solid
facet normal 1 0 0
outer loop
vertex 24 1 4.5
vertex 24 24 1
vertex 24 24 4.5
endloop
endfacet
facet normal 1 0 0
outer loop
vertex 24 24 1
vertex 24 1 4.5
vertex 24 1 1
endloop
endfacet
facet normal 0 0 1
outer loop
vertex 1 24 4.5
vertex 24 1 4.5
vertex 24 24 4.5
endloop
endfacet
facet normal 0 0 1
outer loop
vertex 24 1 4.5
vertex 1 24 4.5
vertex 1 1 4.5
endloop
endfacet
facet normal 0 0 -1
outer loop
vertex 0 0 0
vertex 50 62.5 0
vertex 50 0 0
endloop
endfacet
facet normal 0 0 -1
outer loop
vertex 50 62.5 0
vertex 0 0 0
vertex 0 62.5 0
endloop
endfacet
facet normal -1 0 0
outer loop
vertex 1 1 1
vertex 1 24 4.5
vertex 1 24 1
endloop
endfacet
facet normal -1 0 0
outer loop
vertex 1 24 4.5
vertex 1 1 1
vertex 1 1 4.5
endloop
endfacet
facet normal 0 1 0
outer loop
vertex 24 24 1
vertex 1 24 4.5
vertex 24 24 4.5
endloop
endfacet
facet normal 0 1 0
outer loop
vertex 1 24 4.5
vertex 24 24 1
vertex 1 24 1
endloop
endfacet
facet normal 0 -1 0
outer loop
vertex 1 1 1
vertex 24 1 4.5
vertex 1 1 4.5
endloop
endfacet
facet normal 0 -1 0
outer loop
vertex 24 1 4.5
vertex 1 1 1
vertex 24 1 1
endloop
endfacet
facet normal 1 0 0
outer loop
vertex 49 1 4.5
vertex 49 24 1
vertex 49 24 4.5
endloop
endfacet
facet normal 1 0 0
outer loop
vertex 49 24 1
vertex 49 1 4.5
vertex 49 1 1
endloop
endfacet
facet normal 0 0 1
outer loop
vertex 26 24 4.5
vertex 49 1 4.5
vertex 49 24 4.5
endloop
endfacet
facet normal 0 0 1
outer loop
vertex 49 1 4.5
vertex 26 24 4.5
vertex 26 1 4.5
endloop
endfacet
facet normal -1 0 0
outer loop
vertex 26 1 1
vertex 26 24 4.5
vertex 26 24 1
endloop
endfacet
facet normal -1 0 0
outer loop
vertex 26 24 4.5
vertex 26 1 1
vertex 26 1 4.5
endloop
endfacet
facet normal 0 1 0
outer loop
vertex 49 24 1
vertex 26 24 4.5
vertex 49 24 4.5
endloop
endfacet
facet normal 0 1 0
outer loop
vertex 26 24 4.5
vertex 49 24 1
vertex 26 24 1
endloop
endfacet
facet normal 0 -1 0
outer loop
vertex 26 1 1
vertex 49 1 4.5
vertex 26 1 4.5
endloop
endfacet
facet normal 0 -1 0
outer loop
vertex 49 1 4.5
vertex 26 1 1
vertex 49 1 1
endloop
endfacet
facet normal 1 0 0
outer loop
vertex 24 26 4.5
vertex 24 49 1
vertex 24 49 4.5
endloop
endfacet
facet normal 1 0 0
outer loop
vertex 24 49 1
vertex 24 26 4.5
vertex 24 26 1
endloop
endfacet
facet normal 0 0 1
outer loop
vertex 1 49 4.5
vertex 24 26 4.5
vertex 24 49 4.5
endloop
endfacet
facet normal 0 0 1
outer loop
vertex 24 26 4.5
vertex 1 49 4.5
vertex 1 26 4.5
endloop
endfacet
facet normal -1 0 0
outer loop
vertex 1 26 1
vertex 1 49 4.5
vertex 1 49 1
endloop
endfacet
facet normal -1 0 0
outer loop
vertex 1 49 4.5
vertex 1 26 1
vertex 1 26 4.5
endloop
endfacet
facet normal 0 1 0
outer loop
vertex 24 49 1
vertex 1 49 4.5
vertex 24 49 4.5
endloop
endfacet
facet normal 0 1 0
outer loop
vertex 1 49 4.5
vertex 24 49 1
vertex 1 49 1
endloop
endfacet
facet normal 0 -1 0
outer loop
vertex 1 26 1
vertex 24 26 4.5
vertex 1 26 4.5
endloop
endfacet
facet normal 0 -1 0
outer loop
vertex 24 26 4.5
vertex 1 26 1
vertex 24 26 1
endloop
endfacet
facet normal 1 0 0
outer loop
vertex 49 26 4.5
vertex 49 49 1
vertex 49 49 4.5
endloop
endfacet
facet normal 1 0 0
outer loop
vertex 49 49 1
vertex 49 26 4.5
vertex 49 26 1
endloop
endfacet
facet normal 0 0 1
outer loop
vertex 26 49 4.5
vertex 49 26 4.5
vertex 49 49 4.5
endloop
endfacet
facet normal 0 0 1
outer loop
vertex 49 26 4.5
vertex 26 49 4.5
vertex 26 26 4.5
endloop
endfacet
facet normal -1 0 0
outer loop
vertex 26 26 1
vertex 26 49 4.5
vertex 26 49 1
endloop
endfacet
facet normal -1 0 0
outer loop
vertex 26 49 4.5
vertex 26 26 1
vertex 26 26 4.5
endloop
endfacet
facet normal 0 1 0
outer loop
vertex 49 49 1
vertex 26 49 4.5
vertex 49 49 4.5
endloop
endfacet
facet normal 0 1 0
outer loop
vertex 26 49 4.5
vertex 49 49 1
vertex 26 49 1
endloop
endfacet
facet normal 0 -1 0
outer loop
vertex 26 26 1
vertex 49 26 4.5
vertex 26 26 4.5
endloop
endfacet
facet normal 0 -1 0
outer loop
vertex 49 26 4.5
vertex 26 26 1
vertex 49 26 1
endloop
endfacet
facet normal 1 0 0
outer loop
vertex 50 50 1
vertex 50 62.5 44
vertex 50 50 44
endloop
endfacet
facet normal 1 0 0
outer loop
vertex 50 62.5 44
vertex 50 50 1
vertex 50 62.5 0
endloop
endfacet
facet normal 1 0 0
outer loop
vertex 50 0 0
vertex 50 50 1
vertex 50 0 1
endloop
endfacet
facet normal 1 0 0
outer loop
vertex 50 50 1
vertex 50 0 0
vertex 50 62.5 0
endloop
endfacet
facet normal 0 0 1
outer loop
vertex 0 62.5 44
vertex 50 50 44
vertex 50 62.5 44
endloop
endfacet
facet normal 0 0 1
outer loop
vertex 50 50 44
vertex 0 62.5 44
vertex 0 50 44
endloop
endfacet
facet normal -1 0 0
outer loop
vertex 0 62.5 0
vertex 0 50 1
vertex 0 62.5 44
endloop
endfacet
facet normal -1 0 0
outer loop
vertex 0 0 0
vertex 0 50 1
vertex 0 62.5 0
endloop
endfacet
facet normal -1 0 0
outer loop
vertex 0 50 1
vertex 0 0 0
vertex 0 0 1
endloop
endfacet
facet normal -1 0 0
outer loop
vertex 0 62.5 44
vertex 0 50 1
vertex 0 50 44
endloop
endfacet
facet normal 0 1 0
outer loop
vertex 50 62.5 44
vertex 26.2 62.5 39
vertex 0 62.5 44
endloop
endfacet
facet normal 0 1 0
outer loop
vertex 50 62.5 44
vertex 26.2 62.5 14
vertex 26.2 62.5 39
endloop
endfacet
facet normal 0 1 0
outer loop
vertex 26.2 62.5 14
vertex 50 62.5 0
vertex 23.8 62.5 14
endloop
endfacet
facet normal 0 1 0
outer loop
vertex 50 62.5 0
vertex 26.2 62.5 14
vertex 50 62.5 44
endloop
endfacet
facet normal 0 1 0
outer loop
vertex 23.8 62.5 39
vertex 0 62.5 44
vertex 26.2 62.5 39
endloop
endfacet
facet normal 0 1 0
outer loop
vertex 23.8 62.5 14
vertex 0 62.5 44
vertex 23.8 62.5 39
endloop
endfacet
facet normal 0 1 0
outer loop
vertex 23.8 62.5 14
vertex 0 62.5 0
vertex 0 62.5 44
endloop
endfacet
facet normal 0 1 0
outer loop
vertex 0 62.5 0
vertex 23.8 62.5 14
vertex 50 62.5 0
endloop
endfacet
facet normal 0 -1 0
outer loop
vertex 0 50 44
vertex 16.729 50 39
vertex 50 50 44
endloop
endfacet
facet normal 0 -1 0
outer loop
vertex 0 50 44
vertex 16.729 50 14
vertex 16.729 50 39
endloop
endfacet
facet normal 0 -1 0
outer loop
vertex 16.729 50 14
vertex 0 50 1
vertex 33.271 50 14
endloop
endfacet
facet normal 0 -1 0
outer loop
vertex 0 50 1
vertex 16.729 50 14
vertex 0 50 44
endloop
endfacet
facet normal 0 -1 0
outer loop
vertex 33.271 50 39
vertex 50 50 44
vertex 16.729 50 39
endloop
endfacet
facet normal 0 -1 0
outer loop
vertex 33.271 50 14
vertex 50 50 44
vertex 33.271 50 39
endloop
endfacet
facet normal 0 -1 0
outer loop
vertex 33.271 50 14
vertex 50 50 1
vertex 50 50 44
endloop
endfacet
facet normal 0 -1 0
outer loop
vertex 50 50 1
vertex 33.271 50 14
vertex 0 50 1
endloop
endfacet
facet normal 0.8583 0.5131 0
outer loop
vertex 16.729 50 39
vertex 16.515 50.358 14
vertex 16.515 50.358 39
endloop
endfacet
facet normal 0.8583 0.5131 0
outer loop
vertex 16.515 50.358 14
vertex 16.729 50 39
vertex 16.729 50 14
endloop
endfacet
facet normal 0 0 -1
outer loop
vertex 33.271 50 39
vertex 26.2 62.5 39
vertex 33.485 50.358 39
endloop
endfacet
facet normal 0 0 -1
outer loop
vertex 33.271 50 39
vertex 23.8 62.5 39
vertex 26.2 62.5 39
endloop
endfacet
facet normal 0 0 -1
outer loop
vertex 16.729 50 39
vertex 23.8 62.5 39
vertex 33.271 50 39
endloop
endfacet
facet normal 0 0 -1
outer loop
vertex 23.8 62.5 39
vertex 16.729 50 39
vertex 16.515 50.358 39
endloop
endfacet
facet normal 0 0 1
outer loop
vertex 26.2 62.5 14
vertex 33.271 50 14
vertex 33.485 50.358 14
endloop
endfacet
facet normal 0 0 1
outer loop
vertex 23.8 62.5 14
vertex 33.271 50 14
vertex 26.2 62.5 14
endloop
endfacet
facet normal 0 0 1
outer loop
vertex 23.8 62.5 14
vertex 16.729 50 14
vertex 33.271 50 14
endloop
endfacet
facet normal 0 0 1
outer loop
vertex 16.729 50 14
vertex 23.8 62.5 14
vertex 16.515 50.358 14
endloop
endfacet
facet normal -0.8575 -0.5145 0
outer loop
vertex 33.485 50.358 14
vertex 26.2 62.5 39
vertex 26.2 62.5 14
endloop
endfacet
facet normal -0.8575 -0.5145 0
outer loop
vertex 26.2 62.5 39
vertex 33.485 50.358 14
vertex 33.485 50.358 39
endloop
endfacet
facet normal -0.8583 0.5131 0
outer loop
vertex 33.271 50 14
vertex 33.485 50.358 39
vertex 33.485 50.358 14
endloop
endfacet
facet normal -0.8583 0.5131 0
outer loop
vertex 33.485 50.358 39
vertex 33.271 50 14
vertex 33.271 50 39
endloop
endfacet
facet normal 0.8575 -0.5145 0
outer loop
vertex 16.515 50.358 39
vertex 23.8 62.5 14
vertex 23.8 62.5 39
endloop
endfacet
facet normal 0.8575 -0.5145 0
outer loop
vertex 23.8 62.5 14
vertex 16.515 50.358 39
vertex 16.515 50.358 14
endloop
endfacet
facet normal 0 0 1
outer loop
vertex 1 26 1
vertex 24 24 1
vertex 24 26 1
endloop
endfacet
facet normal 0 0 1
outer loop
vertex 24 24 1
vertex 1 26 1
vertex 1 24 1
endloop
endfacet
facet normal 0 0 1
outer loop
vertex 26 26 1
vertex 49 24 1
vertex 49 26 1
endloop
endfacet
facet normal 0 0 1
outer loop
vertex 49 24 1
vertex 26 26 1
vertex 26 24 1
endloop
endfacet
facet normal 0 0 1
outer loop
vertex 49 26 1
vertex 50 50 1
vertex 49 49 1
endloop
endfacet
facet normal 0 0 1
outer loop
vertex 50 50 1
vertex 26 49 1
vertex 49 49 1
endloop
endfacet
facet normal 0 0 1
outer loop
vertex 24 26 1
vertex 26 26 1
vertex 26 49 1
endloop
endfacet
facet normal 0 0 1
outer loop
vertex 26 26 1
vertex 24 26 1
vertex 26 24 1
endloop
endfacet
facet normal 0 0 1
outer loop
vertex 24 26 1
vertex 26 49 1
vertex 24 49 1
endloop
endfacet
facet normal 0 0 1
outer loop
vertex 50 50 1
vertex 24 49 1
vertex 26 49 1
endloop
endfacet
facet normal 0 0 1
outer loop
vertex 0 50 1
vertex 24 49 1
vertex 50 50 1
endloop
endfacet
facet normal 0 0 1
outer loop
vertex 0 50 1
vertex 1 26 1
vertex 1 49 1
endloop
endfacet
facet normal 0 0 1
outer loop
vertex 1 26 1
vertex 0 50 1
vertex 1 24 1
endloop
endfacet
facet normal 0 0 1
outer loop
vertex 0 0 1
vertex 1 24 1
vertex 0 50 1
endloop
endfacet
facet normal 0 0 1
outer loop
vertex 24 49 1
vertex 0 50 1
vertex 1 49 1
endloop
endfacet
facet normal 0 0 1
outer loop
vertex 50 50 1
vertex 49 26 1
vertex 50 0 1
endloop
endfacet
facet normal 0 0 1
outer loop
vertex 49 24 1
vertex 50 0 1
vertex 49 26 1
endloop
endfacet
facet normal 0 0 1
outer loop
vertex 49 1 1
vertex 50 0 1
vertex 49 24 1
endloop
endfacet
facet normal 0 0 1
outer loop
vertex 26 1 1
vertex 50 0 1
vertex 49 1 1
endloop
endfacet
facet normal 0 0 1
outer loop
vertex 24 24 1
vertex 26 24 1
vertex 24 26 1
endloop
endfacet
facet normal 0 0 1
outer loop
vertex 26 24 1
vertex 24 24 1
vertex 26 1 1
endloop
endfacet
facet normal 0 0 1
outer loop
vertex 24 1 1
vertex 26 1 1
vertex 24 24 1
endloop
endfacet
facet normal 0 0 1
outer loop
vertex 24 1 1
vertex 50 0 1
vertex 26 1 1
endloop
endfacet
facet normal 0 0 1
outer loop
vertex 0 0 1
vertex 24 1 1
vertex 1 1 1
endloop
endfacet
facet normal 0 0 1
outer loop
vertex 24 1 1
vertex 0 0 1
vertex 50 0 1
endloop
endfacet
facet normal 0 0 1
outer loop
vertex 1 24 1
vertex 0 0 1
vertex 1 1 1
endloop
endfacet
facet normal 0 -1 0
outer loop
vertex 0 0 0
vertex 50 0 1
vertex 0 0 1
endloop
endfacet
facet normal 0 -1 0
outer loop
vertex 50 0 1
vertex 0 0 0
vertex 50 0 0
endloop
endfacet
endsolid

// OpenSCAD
color("LightGray") {
    translate([1,1,0]) cube([23,23,4.5]);
    translate([25+1,1,0]) cube([23,23,4.5]);
    translate([1,25+1,0]) cube([23,23,4.5]);
    translate([25+1,25+1,0]) cube([23,23,4.5]);
}
color("Grey") {
    cube([50,50,1]);
    difference() {
        translate([0,50,0]) cube([50,12.5,50-6]);
        translate([25,52+12.5,20-6]) scale([.6,1,1]) rotate([0,0,180+45]) cube([20,20,25]);
        
    }
}
